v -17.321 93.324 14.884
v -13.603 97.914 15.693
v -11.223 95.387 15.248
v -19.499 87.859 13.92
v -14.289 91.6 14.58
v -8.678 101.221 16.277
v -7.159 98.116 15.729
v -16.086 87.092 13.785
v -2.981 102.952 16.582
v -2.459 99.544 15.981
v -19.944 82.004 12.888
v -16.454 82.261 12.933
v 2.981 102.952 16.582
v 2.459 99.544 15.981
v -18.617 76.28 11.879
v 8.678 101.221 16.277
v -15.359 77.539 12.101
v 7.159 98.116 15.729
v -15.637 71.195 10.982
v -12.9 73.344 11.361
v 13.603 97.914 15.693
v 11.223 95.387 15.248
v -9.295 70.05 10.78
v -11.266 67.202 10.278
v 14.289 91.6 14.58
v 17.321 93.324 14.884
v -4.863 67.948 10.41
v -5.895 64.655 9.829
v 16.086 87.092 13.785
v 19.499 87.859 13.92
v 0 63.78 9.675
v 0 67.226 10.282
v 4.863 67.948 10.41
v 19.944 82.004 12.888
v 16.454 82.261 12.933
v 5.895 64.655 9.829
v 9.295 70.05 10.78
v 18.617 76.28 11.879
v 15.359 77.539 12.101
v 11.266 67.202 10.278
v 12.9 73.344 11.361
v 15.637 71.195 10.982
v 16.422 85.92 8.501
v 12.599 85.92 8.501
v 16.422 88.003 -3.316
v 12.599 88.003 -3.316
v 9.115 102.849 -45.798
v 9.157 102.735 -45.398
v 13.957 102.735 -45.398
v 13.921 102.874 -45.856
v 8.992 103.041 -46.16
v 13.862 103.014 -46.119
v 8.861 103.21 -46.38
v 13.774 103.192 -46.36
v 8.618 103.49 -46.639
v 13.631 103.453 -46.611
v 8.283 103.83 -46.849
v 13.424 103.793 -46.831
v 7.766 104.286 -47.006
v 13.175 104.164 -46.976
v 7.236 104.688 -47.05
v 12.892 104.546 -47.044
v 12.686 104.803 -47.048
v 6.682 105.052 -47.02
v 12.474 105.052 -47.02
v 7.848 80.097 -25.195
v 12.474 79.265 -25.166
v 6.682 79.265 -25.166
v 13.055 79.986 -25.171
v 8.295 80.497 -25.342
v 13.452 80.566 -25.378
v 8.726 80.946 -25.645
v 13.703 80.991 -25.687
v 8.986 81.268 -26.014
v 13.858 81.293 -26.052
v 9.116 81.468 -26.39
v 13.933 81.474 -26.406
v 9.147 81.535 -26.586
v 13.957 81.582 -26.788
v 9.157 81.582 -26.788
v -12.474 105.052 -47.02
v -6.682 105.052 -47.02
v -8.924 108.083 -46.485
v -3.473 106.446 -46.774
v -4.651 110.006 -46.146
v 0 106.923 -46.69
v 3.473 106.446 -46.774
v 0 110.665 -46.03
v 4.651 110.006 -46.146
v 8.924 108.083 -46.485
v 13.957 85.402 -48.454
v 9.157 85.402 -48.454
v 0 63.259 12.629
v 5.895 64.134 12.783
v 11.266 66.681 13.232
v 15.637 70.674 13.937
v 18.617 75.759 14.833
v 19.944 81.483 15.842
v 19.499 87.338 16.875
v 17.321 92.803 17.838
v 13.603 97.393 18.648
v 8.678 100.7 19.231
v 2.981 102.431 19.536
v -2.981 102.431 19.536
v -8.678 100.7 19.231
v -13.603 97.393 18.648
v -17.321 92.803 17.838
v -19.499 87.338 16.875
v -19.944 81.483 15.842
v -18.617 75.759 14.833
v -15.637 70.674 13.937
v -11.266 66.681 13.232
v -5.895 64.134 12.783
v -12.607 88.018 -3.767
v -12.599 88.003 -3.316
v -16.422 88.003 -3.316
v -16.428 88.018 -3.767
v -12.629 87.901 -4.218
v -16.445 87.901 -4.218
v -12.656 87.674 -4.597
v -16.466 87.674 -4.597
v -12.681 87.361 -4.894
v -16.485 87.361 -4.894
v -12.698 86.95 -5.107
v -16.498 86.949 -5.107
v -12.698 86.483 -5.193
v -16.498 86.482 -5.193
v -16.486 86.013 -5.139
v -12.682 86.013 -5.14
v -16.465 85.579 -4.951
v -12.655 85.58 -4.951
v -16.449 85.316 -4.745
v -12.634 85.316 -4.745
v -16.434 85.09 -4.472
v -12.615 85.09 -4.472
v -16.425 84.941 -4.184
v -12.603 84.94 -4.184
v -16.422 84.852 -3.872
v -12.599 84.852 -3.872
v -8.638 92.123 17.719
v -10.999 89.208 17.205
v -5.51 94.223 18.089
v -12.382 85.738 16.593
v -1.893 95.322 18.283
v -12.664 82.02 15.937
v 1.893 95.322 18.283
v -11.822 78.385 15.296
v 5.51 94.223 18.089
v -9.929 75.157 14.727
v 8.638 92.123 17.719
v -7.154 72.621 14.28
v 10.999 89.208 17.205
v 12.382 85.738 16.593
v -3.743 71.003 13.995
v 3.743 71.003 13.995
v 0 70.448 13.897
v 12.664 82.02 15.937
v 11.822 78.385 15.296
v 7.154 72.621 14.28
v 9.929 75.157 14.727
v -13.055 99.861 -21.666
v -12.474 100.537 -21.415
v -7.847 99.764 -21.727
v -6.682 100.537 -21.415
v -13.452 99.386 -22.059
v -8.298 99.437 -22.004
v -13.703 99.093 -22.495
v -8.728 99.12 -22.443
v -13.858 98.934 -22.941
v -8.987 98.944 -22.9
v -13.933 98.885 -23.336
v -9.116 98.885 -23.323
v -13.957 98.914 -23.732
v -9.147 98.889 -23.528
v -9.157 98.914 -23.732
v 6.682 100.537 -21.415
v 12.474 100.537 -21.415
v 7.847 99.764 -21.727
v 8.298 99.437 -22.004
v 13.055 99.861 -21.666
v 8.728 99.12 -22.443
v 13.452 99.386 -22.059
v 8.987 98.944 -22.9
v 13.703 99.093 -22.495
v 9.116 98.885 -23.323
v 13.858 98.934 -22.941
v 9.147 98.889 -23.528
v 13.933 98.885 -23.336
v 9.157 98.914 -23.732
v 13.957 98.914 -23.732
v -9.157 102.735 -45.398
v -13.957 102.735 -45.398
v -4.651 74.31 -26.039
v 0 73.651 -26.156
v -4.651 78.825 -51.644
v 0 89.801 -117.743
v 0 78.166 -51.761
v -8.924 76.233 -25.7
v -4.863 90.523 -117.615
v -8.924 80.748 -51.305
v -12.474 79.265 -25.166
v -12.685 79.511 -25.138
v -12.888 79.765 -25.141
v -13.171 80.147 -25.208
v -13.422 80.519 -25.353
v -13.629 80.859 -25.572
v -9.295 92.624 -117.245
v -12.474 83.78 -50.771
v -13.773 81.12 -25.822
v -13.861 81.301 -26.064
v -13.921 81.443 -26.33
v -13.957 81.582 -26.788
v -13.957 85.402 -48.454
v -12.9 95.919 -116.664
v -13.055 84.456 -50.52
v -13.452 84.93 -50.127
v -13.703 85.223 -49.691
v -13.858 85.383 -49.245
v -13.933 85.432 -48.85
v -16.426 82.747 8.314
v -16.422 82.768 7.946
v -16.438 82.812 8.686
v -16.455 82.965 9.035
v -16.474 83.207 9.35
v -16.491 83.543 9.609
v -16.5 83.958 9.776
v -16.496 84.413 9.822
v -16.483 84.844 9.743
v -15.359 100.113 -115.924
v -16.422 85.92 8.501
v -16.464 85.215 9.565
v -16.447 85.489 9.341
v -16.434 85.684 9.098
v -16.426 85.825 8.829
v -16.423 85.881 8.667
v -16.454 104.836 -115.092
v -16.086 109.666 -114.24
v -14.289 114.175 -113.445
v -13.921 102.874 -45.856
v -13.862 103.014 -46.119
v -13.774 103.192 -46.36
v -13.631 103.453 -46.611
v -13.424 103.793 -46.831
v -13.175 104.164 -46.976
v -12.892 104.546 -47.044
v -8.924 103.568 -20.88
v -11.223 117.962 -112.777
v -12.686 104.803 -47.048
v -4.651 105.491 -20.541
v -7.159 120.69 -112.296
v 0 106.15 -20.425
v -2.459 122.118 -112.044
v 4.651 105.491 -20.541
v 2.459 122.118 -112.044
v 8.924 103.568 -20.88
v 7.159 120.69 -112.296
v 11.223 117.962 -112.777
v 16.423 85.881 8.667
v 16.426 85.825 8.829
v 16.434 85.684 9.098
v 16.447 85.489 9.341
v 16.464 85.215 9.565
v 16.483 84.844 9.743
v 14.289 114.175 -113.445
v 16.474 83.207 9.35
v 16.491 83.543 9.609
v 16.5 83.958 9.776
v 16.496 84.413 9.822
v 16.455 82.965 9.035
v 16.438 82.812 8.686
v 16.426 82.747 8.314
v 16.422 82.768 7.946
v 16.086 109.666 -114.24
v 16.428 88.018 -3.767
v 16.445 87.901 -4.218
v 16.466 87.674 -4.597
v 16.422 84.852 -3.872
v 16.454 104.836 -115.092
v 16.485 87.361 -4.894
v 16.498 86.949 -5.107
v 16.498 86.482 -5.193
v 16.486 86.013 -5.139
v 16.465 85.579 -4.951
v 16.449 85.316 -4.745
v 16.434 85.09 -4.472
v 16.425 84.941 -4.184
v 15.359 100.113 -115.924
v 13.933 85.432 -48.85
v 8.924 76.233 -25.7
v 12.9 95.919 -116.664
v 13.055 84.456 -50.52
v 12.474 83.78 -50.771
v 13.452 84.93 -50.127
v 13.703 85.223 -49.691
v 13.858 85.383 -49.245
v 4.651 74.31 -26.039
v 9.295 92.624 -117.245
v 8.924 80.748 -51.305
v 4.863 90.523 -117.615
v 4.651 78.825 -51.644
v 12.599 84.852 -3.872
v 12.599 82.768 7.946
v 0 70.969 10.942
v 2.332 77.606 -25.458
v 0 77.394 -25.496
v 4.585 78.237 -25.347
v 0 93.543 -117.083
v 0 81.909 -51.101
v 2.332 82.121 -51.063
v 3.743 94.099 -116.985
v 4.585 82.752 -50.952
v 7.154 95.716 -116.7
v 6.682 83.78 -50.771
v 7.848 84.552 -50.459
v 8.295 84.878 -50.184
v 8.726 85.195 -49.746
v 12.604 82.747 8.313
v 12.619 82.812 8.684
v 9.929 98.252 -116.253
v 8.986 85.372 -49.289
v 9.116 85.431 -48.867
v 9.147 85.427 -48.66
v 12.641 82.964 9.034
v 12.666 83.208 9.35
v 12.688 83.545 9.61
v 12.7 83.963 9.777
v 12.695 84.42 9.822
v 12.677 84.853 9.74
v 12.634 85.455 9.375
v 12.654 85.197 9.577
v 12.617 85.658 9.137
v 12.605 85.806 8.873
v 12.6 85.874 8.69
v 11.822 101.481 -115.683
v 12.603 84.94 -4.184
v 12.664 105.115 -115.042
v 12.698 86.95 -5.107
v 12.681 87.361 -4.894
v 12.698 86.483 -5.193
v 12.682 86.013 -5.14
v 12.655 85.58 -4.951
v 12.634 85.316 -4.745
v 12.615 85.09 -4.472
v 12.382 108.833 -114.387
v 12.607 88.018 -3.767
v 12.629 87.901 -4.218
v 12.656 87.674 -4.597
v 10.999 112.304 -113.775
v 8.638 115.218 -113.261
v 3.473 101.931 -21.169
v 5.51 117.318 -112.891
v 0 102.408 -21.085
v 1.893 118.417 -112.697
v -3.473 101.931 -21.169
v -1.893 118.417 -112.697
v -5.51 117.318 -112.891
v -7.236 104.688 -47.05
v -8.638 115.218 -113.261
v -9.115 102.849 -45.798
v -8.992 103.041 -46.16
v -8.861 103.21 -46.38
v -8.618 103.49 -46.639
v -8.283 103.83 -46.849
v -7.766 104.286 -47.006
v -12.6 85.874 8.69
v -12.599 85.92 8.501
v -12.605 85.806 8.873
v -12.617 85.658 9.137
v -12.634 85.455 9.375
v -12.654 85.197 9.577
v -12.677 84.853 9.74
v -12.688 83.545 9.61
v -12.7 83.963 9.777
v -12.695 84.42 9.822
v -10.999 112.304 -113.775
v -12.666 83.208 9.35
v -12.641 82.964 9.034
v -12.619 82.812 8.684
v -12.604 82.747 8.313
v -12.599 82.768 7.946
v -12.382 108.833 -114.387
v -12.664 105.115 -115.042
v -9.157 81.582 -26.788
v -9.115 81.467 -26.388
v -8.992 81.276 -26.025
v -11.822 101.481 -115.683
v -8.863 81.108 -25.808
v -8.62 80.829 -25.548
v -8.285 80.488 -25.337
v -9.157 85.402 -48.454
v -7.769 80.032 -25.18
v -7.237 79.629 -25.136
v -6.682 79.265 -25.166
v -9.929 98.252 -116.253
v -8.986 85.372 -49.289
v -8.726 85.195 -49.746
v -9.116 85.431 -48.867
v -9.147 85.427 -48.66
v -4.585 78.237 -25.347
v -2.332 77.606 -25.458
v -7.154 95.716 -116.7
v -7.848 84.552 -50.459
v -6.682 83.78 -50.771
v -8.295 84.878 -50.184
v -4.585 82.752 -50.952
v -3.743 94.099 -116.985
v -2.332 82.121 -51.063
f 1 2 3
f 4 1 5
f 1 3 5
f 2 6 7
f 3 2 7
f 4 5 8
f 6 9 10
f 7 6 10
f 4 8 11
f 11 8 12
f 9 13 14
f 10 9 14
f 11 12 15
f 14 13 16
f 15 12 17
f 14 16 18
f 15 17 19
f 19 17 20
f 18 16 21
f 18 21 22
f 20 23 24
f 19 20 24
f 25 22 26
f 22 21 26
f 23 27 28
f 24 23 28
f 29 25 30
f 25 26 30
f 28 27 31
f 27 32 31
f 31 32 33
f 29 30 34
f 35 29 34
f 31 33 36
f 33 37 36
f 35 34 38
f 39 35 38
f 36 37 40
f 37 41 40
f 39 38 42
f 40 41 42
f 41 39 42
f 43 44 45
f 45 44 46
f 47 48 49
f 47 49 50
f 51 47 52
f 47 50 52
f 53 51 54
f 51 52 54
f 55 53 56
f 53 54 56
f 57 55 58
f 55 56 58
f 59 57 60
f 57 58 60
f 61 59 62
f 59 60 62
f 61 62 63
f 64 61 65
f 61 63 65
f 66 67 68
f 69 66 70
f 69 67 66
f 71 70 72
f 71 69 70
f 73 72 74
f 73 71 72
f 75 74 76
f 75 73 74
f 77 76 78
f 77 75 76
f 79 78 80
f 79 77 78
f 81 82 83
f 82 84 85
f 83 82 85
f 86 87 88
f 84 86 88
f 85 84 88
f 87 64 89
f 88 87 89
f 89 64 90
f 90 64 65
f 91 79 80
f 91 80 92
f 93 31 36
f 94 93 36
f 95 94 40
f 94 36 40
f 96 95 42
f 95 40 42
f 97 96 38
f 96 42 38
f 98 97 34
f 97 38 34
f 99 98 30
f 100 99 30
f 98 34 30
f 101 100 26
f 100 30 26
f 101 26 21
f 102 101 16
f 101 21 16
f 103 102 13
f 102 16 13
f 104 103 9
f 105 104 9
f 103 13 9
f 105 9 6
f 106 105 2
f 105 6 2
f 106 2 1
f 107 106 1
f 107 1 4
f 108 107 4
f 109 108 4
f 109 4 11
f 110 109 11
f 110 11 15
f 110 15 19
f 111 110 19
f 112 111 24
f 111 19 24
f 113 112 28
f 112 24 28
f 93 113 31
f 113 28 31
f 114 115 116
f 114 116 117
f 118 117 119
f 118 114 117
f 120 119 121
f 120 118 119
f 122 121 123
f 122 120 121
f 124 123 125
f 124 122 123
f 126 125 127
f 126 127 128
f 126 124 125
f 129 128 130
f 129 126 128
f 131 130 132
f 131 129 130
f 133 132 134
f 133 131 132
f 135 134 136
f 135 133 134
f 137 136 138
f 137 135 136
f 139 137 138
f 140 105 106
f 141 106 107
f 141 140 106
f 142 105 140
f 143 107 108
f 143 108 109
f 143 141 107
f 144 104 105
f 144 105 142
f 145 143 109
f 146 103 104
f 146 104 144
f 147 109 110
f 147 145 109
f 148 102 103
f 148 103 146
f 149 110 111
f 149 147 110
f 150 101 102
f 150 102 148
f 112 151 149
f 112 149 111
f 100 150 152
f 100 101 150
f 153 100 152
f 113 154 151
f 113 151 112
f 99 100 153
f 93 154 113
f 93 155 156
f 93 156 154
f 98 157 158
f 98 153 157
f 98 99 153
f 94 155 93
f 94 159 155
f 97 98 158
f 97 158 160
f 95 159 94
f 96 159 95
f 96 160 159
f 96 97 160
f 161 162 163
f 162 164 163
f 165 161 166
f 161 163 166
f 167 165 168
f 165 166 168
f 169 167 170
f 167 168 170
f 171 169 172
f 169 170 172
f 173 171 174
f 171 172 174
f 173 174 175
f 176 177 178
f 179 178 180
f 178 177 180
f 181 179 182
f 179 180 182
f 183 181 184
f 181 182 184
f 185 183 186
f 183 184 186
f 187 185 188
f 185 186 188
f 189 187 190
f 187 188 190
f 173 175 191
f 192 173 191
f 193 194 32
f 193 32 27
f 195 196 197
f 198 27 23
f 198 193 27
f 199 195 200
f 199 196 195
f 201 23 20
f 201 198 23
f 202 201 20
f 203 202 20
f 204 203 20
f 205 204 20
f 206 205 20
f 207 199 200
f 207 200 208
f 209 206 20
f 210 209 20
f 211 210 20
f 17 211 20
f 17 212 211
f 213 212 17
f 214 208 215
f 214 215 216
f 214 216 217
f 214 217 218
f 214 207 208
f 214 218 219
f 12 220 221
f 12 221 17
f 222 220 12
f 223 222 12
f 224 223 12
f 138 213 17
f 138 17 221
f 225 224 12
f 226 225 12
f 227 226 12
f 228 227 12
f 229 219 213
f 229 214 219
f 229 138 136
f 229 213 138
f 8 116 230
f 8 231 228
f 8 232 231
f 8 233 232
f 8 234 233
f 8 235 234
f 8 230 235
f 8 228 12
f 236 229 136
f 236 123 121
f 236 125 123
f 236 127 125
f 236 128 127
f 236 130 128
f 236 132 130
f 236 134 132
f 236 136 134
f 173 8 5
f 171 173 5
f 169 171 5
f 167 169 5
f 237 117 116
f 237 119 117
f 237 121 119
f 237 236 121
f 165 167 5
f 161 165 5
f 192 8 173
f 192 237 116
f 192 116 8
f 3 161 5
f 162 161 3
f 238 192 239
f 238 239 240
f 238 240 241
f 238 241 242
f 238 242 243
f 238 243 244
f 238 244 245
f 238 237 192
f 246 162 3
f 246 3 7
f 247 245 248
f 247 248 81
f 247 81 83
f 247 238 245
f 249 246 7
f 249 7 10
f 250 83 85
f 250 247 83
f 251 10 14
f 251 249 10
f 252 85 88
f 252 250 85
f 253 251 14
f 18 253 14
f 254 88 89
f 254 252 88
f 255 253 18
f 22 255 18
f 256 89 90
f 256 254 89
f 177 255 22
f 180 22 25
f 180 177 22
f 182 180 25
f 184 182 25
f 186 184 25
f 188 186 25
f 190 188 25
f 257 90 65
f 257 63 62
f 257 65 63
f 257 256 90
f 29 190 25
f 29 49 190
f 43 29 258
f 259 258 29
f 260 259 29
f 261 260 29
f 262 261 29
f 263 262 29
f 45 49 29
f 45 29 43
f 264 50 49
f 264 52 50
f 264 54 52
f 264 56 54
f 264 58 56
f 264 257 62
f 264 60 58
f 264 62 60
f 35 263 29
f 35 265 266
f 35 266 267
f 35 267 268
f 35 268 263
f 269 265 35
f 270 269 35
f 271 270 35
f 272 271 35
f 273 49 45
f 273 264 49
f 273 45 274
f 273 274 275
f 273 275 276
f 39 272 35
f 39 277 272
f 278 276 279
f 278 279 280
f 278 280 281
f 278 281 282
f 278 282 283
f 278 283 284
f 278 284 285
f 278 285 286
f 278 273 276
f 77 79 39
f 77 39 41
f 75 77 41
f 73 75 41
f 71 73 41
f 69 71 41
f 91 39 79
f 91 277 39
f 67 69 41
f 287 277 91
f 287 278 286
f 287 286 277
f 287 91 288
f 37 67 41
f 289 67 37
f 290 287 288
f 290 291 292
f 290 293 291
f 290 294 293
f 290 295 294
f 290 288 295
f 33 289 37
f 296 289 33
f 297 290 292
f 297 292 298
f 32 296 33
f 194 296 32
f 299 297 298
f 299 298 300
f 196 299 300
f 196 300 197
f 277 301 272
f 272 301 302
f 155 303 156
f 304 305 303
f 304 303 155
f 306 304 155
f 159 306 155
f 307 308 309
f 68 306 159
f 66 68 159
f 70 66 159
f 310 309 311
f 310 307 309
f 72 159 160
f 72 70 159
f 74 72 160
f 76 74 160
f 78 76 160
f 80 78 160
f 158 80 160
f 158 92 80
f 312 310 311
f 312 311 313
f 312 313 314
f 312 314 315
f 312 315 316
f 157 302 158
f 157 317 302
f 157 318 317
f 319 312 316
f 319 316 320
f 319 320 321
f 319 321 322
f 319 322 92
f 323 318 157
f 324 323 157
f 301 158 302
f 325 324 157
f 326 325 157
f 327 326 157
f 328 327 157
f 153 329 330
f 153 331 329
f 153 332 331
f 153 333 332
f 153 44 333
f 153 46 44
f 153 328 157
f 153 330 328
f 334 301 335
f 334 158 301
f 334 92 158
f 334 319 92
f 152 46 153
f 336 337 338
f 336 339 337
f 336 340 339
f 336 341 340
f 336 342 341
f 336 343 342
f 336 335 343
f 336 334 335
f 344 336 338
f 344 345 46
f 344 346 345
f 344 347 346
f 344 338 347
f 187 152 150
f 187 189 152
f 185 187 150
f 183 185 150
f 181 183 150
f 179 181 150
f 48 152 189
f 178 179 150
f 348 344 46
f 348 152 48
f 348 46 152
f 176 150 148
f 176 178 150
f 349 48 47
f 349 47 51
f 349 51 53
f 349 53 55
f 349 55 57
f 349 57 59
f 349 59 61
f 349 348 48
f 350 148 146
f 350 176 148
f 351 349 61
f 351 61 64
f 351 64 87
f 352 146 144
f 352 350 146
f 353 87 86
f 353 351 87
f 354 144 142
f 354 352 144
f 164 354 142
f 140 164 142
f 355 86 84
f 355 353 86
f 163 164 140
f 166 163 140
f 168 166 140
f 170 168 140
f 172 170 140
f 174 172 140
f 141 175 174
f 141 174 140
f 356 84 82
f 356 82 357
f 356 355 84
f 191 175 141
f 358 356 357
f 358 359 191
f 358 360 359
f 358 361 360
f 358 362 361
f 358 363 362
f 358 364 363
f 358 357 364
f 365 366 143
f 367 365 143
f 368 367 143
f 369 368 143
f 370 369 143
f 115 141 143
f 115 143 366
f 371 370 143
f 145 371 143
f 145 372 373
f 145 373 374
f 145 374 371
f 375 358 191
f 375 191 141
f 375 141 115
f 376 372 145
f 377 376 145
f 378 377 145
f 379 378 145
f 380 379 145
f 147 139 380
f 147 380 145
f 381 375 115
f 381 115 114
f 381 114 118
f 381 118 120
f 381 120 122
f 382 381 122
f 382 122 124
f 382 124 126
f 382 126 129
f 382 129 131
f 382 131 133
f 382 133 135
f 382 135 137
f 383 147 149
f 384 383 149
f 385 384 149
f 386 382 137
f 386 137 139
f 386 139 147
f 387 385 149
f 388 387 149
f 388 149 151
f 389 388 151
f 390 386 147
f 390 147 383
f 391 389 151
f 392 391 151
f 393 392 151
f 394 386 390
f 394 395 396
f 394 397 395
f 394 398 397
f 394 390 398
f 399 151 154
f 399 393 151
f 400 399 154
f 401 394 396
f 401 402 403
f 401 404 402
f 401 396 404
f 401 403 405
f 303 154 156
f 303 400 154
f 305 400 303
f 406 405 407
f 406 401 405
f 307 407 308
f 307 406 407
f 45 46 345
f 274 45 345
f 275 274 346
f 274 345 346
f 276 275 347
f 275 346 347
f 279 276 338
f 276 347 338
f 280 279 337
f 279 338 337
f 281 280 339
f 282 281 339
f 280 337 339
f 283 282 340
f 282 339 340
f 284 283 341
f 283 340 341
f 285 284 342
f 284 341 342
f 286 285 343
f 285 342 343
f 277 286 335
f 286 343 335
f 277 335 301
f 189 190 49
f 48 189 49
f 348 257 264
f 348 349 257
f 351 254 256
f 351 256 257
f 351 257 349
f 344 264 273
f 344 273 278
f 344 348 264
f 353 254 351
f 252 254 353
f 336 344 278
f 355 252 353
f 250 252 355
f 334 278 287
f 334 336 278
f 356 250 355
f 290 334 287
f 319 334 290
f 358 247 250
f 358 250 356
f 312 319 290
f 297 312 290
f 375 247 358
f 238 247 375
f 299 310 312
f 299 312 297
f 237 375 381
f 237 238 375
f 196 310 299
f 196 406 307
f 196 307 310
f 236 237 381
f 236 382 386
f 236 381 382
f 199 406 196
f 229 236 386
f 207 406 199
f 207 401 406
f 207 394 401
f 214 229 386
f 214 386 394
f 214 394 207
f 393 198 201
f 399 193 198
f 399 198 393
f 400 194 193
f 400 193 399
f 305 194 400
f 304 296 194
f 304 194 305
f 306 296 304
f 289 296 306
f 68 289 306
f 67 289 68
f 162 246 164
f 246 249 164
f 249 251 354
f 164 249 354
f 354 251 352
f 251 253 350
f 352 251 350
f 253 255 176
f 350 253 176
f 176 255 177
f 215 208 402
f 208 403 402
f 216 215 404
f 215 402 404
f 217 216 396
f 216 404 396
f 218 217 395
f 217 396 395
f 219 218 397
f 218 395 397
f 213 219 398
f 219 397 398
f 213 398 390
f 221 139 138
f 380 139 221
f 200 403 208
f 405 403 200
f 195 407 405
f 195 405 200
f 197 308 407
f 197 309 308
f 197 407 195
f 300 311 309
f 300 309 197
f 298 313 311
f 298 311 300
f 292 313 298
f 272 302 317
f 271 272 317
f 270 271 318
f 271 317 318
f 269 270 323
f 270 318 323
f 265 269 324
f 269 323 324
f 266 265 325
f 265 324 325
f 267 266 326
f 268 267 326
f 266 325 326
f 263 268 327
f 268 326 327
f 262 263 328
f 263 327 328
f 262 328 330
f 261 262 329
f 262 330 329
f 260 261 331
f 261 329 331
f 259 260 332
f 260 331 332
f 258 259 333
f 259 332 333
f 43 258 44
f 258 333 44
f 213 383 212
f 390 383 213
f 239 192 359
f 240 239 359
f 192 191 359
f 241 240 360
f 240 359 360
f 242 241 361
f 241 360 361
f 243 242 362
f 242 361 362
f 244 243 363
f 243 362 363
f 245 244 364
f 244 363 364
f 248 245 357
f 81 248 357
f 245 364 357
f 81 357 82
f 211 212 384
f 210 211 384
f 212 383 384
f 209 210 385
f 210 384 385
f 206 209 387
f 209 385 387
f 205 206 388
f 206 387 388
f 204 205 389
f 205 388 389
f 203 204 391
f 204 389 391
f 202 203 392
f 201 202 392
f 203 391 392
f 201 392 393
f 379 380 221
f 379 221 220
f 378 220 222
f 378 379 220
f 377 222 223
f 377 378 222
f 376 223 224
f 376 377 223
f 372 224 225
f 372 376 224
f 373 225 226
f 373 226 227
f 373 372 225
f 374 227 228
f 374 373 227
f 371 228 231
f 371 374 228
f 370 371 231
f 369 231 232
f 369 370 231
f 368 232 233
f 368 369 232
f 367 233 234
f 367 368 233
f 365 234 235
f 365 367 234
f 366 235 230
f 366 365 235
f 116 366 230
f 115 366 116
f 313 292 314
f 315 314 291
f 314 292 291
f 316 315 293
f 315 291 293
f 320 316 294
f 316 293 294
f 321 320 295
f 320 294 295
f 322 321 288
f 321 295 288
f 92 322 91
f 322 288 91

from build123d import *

# Parameters (mm, degrees)
BOSS_EXTRUDE1_DEPTH     = 25
FILLET1_R               = 2
CUT_EXTRUDE1_DEPTH      = 171.565921027
CUT_EXTRUDE1_DEPTH_BACK = 171.565921027
SKETCH4_R               = 20
SKETCH4_R_2             = 16.5
SKETCH4_R_3             = 12.7
BOSS_EXTRUDE2_DEPTH     = 3


with BuildPart() as part:
    # Sketch1 → Revolve1 (revolve)
    with BuildSketch(Plane(origin=(0, 0, 0), x_dir=(0, 0, -1), z_dir=(1, 0, 0)), mode=Mode.PRIVATE) as revolve1_sk:
        Polygon((112.672204387, 118.557087119), (-15.352803504, 95.982824023), (-16.01266658, 99.725093484), (112.012341312, 122.299356581), align=None)
    revolve(revolve1_sk.sketch.rotate(Axis((0, 83.475765559, 13.147471648), (0, 0.17364817766692353, -0.9848077530122092)), 180), axis=Axis((0, 83.475765559, 13.147471648), (0, 0.17364817766692353, -0.9848077530122092)))


with BuildPart() as body_2:
    # Sketch2 → Boss-Extrude1 (new, symmetric)
    with BuildSketch(Plane(origin=(0, 0, 0), x_dir=(0, 0, -1), z_dir=(1, 0, 0))):
        Polygon((20.025829473, 108.41513389), (21.76231125, 98.56705636), (47.367312828, 103.081908979), (45.630831052, 112.929986509), align=None)
    extrude(amount=BOSS_EXTRUDE1_DEPTH, both=True)


with BuildPart() as body_3:
    # Mirror1: mirrored copy
    add(body_2.part.mirror(Plane(origin=(0, 83.207013304, 14.67164143), x_dir=(0, -0.17364817766692353, 0.9848077530122092), z_dir=(0, -0.9848077530122092, -0.17364817766692353))))


with BuildPart() as part_1:
    add(part.part)

    # Combine2: cut body 2, body 3
    add(body_2.part, mode=Mode.SUBTRACT)
    add(body_3.part, mode=Mode.SUBTRACT)

    # Fillet1
    fillet1_edges = [part_1.edges().sort_by_distance(p)[0] for p in [
        (-11.557199929, 98.56705636, -21.76231125),
        (11.557199929, 98.56705636, -21.76231125),
        (-11.557199929, 103.081908979, -47.367312828),
        (11.557199929, 103.081908979, -47.367312828),
        (-11.557199929, 81.234439907, -24.818519177),
        (11.557199929, 81.234439907, -24.818519177),
        (11.557199929, 85.749292526, -50.423520755),
        (-11.557199929, 85.749292526, -50.423520755),
    ]]
    fillet(fillet1_edges, radius=FILLET1_R)

    # Sketch3 → Cut-Extrude1 (cut, two sides)
    with BuildSketch(Plane(origin=(0, 0, 0), x_dir=(0, 0, -1), z_dir=(1, 0, 0))) as cut_extrude1_sk:
        with BuildLine():
            Line((-8.501269967, 85.919698853), (3.316423069, 88.003476985))
            ThreePointArc((3.316423069, 88.003476985), (5.169952558, 86.705621664), (3.872097237, 84.852092175))
            Line((3.872097237, 84.852092175), (-7.945595799, 82.768314043))
            ThreePointArc((-7.945595799, 82.768314043), (-9.799125288, 84.066169363), (-8.501269967, 85.919698853))
        make_face()
    extrude(amount=CUT_EXTRUDE1_DEPTH, mode=Mode.SUBTRACT)
    extrude(cut_extrude1_sk.sketch, amount=-CUT_EXTRUDE1_DEPTH_BACK, mode=Mode.SUBTRACT)

    # Sketch4 → Boss-Extrude2 (add)
    with BuildSketch(Plane(origin=(0, 0.268752256, -1.524169782), x_dir=(1, 0, 0), z_dir=(0, -0.17364817766692353, 0.9848077530122092))):
        with Locations(Location((0, 84.490615604, 0), (0, 0, 270))):
            Circle(SKETCH4_R)
        with Locations(Location((0, 84.490615604, 0), (0, 0, 270))):
            Circle(SKETCH4_R_2, mode=Mode.SUBTRACT)
        with Locations(Location((0, 84.490615604, 0), (0, 0, 270))):
            Circle(SKETCH4_R_2)
        with Locations(Location((0, 84.490615604, 0), (0, 0, 270))):
            Circle(SKETCH4_R_3, mode=Mode.SUBTRACT)
    extrude(amount=BOSS_EXTRUDE2_DEPTH)


solid = part_1.part
